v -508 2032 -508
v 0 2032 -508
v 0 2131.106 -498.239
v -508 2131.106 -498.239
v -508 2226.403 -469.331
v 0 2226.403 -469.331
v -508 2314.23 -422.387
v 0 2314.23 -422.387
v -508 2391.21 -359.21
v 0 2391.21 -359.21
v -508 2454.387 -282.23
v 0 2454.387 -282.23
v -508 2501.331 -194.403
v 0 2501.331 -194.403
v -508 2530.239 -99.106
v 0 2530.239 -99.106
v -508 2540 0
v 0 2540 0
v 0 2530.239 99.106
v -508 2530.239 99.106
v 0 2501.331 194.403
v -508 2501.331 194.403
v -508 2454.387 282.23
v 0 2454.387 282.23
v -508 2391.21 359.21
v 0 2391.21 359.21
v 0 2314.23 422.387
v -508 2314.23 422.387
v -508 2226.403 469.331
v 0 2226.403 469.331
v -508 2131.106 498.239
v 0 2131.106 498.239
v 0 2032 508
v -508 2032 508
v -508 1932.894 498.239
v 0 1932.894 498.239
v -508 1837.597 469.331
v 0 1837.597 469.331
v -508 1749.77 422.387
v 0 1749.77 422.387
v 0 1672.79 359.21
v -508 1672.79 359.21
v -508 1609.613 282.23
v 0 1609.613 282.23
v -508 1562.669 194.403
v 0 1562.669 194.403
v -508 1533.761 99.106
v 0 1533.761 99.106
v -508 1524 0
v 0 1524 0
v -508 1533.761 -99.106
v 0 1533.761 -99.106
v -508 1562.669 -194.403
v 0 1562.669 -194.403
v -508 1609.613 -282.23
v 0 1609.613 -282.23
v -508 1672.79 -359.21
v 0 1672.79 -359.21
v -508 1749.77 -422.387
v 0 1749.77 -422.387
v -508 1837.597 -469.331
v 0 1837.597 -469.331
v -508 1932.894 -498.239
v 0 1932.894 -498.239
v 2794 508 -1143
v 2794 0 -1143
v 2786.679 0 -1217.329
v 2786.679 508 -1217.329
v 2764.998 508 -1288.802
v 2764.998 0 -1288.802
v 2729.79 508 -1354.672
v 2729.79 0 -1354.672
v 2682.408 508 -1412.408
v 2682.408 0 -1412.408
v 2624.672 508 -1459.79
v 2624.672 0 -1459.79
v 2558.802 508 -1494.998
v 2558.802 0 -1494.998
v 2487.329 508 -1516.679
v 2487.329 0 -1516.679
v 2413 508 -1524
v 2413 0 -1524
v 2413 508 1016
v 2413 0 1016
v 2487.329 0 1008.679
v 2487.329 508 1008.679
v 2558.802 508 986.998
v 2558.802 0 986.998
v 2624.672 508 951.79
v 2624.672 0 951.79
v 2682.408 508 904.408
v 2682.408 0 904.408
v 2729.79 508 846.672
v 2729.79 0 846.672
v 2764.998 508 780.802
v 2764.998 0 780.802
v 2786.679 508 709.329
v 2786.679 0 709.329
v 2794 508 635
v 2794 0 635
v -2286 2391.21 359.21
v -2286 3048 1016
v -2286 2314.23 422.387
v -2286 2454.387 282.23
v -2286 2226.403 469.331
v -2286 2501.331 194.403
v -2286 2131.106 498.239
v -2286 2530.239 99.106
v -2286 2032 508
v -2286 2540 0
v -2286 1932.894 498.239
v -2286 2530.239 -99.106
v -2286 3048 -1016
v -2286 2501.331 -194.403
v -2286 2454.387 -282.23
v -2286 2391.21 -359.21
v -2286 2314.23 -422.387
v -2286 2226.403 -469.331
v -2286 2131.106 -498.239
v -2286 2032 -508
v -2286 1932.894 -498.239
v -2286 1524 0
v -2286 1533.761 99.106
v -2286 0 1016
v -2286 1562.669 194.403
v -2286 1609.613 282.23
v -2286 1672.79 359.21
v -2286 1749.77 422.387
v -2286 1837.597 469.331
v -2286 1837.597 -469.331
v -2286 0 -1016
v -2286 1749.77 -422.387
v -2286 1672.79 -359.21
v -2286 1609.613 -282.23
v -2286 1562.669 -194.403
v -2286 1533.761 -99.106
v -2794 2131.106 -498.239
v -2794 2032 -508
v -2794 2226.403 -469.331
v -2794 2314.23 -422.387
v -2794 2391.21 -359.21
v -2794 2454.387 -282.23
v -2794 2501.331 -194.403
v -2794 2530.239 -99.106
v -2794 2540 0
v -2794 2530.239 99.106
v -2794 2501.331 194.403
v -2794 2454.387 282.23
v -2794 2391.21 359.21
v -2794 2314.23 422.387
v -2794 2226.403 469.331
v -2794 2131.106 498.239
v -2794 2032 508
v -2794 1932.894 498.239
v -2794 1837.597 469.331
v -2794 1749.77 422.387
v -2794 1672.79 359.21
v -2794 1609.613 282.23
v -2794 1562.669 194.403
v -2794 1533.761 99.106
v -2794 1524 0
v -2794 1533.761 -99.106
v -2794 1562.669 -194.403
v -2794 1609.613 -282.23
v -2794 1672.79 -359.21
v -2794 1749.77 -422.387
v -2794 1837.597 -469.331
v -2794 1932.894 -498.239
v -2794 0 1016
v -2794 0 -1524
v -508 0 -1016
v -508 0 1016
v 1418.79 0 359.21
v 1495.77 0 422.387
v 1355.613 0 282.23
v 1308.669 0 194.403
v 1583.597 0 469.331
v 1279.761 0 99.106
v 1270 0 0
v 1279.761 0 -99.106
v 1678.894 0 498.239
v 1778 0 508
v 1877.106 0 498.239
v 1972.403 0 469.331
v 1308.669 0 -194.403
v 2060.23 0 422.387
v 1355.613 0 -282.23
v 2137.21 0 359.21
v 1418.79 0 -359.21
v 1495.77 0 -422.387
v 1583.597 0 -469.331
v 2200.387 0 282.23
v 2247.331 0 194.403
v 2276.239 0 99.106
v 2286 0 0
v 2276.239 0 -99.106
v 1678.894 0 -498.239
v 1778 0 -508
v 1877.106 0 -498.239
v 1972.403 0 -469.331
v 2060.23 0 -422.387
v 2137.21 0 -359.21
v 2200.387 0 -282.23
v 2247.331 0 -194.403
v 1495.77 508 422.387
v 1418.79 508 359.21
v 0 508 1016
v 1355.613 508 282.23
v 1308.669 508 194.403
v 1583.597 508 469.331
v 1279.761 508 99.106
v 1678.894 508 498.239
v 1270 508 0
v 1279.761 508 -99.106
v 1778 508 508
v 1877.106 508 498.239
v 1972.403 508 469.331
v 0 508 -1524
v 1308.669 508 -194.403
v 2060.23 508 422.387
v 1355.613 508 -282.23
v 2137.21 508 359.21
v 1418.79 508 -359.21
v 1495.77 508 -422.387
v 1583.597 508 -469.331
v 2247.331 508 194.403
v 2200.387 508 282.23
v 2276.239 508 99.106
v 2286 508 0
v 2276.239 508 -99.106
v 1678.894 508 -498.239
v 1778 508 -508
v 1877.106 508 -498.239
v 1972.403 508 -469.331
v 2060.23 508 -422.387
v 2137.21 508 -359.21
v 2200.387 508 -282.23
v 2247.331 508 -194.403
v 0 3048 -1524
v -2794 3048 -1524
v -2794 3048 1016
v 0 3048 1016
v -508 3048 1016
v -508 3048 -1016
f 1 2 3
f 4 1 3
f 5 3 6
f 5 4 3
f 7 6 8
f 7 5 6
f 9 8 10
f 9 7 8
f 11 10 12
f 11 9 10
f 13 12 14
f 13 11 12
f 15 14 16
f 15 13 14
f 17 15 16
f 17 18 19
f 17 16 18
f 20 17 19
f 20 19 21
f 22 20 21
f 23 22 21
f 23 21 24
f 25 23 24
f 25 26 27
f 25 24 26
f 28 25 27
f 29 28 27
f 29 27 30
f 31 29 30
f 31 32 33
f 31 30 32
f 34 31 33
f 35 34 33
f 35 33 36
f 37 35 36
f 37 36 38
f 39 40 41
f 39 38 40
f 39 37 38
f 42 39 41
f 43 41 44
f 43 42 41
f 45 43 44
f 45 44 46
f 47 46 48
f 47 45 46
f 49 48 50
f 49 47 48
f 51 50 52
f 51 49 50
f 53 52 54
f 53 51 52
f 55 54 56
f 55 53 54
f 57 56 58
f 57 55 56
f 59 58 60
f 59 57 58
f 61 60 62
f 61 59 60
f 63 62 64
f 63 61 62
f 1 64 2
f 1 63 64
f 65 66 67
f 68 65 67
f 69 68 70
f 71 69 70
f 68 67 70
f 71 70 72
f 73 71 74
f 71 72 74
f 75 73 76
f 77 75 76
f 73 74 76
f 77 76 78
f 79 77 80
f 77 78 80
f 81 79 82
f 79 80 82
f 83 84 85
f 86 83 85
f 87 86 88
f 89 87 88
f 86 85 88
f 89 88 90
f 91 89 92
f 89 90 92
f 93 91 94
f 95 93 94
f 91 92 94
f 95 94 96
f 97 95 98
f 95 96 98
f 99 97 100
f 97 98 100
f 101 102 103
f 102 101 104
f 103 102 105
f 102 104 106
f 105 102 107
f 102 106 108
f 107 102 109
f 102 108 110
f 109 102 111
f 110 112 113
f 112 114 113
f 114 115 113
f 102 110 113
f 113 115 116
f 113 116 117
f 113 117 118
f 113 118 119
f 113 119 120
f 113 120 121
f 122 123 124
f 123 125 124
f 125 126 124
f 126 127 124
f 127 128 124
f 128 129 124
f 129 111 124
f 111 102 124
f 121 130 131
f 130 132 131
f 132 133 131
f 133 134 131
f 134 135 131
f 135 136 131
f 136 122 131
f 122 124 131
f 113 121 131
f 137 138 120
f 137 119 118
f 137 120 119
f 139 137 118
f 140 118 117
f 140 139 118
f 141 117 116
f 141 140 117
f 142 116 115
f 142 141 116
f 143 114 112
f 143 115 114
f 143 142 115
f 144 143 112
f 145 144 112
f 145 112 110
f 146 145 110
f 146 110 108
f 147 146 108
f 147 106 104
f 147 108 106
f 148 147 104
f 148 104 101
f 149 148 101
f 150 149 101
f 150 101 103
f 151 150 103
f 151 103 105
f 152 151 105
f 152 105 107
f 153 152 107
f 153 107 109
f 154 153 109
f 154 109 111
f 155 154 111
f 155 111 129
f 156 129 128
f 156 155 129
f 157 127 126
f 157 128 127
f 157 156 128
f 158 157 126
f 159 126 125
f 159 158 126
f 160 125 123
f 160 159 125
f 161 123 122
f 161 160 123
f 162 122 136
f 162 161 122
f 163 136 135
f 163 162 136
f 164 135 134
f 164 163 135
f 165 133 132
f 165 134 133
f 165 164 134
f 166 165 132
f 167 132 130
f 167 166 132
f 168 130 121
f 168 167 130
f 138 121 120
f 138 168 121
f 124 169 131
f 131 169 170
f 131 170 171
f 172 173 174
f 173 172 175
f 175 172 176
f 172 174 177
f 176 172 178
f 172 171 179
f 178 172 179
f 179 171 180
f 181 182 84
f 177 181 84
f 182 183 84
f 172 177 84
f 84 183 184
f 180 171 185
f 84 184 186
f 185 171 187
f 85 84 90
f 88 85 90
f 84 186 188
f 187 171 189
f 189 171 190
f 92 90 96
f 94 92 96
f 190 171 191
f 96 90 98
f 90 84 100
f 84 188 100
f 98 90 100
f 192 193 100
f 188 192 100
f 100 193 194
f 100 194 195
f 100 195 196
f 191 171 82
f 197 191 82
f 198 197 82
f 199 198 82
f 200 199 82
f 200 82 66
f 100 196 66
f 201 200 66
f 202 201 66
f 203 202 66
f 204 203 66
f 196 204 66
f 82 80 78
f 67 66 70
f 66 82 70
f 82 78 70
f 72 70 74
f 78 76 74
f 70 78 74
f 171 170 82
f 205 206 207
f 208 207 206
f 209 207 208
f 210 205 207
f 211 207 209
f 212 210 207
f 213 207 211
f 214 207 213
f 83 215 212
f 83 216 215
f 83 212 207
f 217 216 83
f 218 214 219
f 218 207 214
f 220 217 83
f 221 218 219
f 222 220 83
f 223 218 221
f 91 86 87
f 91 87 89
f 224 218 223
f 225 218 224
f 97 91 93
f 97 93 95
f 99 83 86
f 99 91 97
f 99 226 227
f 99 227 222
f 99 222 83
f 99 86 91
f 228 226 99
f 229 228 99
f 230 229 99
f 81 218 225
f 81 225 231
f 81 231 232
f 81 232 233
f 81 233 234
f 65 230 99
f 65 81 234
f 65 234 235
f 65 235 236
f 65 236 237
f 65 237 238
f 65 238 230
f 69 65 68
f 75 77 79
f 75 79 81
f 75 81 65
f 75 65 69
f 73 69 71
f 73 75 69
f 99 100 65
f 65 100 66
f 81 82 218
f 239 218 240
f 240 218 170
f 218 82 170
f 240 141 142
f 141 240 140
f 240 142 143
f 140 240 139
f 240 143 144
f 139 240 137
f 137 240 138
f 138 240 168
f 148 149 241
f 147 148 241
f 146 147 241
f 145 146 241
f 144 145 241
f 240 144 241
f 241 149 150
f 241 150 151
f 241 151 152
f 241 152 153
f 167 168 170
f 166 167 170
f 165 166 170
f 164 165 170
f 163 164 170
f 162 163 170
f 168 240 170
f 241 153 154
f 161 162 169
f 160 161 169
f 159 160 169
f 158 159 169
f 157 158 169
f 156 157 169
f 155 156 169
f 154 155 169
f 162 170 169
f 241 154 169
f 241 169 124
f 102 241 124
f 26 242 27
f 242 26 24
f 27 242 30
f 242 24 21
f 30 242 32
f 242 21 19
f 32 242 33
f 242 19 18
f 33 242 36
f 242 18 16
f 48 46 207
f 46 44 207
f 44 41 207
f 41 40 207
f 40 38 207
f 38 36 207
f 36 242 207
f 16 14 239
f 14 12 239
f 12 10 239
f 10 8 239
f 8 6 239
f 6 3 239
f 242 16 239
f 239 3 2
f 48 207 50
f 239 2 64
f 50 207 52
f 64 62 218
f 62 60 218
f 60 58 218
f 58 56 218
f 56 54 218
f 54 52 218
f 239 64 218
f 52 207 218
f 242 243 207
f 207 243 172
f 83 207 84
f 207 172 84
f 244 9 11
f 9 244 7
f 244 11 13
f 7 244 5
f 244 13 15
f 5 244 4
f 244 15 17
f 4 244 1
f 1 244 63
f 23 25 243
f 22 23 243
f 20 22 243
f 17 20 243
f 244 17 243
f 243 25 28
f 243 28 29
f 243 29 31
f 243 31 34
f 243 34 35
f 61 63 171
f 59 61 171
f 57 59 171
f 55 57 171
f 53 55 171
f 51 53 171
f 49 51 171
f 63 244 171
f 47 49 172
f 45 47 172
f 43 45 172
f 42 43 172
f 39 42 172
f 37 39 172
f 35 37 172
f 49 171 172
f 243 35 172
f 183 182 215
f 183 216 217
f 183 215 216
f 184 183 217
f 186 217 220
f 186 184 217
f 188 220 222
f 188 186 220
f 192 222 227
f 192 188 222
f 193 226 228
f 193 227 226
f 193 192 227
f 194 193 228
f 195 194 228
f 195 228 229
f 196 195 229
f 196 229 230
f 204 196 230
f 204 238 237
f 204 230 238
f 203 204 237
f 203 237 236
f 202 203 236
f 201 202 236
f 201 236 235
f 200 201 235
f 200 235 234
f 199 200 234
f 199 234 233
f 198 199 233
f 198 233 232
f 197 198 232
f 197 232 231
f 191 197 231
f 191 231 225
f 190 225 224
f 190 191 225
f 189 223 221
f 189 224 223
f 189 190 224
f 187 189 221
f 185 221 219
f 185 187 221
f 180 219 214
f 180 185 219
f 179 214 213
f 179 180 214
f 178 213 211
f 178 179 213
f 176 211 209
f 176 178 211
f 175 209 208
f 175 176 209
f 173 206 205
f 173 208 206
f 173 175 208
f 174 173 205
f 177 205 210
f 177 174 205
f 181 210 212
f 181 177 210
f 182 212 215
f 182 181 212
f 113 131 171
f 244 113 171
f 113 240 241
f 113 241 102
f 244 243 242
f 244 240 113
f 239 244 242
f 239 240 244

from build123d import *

# Parameters (mm, degrees)
EXTRUDE_1_DEPTH          = 508
CUT_EXTRUDE_1_DEPTH      = 3223.898695274
CUT_EXTRUDE_1_DEPTH_BACK = 3223.898695274
SKETCH_4_R               = 508
EXTRUDE_2_DEPTH          = 3048
CUT_EXTRUDE_2_DEPTH      = 4407.735299516
CUT_EXTRUDE_2_DEPTH_BACK = 4407.735299516
SKETCH_5_R               = 508


with BuildPart() as part:
    # 草图3 → 凸台-拉伸1 (new body)
    with BuildSketch(Plane(origin=(0, 0, 0), x_dir=(1, 0, 0), z_dir=(0, 1, 0))):
        with BuildLine():
            Line((0, 1524), (0, -1016))
            Line((0, -1016), (2413, -1016))
            ThreePointArc((2413, -1016), (2682.407683632, -904.407683632), (2794, -635))
            Line((2794, -635), (2794, 1143))
            ThreePointArc((2794, 1143), (2682.407683632, 1412.407683632), (2413, 1524))
            Line((2413, 1524), (0, 1524))
        make_face()
    extrude(amount=EXTRUDE_1_DEPTH)

    # 草图4 → 切除-拉伸1 (cut, two sides: drawn at the far end of the back side and taken through both)
    with BuildSketch(Plane(origin=(0, 0, 0), x_dir=(1, 0, 0), z_dir=(0, 1, 0)).offset(-CUT_EXTRUDE_1_DEPTH_BACK)):
        with Locations(Location((1778, 0, 0), (0, 0, 270))):
            Circle(SKETCH_4_R)
    extrude(amount=CUT_EXTRUDE_1_DEPTH + CUT_EXTRUDE_1_DEPTH_BACK, mode=Mode.SUBTRACT)

    # 草图1 → 凸台-拉伸2 (add)
    with BuildSketch(Plane(origin=(0, 0, 0), x_dir=(1, 0, 0), z_dir=(0, 1, 0))):
        Polygon((-508, -1016), (0, -1016), (0, 1524), (-2794, 1524), (-2794, -1016), (-2286, -1016), (-2286, 1016), (-508, 1016), align=None)
    extrude(amount=EXTRUDE_2_DEPTH)

    # 草图5 → 切除-拉伸2 (cut, two sides: drawn at the far end of the back side and taken through both)
    with BuildSketch(Plane(origin=(0, 0, 0), x_dir=(0, 0, -1), z_dir=(1, 0, 0)).offset(-CUT_EXTRUDE_2_DEPTH_BACK)):
        with Locations((0, 2032)):
            Circle(SKETCH_5_R)
    extrude(amount=CUT_EXTRUDE_2_DEPTH + CUT_EXTRUDE_2_DEPTH_BACK, mode=Mode.SUBTRACT)


solid = part.part
